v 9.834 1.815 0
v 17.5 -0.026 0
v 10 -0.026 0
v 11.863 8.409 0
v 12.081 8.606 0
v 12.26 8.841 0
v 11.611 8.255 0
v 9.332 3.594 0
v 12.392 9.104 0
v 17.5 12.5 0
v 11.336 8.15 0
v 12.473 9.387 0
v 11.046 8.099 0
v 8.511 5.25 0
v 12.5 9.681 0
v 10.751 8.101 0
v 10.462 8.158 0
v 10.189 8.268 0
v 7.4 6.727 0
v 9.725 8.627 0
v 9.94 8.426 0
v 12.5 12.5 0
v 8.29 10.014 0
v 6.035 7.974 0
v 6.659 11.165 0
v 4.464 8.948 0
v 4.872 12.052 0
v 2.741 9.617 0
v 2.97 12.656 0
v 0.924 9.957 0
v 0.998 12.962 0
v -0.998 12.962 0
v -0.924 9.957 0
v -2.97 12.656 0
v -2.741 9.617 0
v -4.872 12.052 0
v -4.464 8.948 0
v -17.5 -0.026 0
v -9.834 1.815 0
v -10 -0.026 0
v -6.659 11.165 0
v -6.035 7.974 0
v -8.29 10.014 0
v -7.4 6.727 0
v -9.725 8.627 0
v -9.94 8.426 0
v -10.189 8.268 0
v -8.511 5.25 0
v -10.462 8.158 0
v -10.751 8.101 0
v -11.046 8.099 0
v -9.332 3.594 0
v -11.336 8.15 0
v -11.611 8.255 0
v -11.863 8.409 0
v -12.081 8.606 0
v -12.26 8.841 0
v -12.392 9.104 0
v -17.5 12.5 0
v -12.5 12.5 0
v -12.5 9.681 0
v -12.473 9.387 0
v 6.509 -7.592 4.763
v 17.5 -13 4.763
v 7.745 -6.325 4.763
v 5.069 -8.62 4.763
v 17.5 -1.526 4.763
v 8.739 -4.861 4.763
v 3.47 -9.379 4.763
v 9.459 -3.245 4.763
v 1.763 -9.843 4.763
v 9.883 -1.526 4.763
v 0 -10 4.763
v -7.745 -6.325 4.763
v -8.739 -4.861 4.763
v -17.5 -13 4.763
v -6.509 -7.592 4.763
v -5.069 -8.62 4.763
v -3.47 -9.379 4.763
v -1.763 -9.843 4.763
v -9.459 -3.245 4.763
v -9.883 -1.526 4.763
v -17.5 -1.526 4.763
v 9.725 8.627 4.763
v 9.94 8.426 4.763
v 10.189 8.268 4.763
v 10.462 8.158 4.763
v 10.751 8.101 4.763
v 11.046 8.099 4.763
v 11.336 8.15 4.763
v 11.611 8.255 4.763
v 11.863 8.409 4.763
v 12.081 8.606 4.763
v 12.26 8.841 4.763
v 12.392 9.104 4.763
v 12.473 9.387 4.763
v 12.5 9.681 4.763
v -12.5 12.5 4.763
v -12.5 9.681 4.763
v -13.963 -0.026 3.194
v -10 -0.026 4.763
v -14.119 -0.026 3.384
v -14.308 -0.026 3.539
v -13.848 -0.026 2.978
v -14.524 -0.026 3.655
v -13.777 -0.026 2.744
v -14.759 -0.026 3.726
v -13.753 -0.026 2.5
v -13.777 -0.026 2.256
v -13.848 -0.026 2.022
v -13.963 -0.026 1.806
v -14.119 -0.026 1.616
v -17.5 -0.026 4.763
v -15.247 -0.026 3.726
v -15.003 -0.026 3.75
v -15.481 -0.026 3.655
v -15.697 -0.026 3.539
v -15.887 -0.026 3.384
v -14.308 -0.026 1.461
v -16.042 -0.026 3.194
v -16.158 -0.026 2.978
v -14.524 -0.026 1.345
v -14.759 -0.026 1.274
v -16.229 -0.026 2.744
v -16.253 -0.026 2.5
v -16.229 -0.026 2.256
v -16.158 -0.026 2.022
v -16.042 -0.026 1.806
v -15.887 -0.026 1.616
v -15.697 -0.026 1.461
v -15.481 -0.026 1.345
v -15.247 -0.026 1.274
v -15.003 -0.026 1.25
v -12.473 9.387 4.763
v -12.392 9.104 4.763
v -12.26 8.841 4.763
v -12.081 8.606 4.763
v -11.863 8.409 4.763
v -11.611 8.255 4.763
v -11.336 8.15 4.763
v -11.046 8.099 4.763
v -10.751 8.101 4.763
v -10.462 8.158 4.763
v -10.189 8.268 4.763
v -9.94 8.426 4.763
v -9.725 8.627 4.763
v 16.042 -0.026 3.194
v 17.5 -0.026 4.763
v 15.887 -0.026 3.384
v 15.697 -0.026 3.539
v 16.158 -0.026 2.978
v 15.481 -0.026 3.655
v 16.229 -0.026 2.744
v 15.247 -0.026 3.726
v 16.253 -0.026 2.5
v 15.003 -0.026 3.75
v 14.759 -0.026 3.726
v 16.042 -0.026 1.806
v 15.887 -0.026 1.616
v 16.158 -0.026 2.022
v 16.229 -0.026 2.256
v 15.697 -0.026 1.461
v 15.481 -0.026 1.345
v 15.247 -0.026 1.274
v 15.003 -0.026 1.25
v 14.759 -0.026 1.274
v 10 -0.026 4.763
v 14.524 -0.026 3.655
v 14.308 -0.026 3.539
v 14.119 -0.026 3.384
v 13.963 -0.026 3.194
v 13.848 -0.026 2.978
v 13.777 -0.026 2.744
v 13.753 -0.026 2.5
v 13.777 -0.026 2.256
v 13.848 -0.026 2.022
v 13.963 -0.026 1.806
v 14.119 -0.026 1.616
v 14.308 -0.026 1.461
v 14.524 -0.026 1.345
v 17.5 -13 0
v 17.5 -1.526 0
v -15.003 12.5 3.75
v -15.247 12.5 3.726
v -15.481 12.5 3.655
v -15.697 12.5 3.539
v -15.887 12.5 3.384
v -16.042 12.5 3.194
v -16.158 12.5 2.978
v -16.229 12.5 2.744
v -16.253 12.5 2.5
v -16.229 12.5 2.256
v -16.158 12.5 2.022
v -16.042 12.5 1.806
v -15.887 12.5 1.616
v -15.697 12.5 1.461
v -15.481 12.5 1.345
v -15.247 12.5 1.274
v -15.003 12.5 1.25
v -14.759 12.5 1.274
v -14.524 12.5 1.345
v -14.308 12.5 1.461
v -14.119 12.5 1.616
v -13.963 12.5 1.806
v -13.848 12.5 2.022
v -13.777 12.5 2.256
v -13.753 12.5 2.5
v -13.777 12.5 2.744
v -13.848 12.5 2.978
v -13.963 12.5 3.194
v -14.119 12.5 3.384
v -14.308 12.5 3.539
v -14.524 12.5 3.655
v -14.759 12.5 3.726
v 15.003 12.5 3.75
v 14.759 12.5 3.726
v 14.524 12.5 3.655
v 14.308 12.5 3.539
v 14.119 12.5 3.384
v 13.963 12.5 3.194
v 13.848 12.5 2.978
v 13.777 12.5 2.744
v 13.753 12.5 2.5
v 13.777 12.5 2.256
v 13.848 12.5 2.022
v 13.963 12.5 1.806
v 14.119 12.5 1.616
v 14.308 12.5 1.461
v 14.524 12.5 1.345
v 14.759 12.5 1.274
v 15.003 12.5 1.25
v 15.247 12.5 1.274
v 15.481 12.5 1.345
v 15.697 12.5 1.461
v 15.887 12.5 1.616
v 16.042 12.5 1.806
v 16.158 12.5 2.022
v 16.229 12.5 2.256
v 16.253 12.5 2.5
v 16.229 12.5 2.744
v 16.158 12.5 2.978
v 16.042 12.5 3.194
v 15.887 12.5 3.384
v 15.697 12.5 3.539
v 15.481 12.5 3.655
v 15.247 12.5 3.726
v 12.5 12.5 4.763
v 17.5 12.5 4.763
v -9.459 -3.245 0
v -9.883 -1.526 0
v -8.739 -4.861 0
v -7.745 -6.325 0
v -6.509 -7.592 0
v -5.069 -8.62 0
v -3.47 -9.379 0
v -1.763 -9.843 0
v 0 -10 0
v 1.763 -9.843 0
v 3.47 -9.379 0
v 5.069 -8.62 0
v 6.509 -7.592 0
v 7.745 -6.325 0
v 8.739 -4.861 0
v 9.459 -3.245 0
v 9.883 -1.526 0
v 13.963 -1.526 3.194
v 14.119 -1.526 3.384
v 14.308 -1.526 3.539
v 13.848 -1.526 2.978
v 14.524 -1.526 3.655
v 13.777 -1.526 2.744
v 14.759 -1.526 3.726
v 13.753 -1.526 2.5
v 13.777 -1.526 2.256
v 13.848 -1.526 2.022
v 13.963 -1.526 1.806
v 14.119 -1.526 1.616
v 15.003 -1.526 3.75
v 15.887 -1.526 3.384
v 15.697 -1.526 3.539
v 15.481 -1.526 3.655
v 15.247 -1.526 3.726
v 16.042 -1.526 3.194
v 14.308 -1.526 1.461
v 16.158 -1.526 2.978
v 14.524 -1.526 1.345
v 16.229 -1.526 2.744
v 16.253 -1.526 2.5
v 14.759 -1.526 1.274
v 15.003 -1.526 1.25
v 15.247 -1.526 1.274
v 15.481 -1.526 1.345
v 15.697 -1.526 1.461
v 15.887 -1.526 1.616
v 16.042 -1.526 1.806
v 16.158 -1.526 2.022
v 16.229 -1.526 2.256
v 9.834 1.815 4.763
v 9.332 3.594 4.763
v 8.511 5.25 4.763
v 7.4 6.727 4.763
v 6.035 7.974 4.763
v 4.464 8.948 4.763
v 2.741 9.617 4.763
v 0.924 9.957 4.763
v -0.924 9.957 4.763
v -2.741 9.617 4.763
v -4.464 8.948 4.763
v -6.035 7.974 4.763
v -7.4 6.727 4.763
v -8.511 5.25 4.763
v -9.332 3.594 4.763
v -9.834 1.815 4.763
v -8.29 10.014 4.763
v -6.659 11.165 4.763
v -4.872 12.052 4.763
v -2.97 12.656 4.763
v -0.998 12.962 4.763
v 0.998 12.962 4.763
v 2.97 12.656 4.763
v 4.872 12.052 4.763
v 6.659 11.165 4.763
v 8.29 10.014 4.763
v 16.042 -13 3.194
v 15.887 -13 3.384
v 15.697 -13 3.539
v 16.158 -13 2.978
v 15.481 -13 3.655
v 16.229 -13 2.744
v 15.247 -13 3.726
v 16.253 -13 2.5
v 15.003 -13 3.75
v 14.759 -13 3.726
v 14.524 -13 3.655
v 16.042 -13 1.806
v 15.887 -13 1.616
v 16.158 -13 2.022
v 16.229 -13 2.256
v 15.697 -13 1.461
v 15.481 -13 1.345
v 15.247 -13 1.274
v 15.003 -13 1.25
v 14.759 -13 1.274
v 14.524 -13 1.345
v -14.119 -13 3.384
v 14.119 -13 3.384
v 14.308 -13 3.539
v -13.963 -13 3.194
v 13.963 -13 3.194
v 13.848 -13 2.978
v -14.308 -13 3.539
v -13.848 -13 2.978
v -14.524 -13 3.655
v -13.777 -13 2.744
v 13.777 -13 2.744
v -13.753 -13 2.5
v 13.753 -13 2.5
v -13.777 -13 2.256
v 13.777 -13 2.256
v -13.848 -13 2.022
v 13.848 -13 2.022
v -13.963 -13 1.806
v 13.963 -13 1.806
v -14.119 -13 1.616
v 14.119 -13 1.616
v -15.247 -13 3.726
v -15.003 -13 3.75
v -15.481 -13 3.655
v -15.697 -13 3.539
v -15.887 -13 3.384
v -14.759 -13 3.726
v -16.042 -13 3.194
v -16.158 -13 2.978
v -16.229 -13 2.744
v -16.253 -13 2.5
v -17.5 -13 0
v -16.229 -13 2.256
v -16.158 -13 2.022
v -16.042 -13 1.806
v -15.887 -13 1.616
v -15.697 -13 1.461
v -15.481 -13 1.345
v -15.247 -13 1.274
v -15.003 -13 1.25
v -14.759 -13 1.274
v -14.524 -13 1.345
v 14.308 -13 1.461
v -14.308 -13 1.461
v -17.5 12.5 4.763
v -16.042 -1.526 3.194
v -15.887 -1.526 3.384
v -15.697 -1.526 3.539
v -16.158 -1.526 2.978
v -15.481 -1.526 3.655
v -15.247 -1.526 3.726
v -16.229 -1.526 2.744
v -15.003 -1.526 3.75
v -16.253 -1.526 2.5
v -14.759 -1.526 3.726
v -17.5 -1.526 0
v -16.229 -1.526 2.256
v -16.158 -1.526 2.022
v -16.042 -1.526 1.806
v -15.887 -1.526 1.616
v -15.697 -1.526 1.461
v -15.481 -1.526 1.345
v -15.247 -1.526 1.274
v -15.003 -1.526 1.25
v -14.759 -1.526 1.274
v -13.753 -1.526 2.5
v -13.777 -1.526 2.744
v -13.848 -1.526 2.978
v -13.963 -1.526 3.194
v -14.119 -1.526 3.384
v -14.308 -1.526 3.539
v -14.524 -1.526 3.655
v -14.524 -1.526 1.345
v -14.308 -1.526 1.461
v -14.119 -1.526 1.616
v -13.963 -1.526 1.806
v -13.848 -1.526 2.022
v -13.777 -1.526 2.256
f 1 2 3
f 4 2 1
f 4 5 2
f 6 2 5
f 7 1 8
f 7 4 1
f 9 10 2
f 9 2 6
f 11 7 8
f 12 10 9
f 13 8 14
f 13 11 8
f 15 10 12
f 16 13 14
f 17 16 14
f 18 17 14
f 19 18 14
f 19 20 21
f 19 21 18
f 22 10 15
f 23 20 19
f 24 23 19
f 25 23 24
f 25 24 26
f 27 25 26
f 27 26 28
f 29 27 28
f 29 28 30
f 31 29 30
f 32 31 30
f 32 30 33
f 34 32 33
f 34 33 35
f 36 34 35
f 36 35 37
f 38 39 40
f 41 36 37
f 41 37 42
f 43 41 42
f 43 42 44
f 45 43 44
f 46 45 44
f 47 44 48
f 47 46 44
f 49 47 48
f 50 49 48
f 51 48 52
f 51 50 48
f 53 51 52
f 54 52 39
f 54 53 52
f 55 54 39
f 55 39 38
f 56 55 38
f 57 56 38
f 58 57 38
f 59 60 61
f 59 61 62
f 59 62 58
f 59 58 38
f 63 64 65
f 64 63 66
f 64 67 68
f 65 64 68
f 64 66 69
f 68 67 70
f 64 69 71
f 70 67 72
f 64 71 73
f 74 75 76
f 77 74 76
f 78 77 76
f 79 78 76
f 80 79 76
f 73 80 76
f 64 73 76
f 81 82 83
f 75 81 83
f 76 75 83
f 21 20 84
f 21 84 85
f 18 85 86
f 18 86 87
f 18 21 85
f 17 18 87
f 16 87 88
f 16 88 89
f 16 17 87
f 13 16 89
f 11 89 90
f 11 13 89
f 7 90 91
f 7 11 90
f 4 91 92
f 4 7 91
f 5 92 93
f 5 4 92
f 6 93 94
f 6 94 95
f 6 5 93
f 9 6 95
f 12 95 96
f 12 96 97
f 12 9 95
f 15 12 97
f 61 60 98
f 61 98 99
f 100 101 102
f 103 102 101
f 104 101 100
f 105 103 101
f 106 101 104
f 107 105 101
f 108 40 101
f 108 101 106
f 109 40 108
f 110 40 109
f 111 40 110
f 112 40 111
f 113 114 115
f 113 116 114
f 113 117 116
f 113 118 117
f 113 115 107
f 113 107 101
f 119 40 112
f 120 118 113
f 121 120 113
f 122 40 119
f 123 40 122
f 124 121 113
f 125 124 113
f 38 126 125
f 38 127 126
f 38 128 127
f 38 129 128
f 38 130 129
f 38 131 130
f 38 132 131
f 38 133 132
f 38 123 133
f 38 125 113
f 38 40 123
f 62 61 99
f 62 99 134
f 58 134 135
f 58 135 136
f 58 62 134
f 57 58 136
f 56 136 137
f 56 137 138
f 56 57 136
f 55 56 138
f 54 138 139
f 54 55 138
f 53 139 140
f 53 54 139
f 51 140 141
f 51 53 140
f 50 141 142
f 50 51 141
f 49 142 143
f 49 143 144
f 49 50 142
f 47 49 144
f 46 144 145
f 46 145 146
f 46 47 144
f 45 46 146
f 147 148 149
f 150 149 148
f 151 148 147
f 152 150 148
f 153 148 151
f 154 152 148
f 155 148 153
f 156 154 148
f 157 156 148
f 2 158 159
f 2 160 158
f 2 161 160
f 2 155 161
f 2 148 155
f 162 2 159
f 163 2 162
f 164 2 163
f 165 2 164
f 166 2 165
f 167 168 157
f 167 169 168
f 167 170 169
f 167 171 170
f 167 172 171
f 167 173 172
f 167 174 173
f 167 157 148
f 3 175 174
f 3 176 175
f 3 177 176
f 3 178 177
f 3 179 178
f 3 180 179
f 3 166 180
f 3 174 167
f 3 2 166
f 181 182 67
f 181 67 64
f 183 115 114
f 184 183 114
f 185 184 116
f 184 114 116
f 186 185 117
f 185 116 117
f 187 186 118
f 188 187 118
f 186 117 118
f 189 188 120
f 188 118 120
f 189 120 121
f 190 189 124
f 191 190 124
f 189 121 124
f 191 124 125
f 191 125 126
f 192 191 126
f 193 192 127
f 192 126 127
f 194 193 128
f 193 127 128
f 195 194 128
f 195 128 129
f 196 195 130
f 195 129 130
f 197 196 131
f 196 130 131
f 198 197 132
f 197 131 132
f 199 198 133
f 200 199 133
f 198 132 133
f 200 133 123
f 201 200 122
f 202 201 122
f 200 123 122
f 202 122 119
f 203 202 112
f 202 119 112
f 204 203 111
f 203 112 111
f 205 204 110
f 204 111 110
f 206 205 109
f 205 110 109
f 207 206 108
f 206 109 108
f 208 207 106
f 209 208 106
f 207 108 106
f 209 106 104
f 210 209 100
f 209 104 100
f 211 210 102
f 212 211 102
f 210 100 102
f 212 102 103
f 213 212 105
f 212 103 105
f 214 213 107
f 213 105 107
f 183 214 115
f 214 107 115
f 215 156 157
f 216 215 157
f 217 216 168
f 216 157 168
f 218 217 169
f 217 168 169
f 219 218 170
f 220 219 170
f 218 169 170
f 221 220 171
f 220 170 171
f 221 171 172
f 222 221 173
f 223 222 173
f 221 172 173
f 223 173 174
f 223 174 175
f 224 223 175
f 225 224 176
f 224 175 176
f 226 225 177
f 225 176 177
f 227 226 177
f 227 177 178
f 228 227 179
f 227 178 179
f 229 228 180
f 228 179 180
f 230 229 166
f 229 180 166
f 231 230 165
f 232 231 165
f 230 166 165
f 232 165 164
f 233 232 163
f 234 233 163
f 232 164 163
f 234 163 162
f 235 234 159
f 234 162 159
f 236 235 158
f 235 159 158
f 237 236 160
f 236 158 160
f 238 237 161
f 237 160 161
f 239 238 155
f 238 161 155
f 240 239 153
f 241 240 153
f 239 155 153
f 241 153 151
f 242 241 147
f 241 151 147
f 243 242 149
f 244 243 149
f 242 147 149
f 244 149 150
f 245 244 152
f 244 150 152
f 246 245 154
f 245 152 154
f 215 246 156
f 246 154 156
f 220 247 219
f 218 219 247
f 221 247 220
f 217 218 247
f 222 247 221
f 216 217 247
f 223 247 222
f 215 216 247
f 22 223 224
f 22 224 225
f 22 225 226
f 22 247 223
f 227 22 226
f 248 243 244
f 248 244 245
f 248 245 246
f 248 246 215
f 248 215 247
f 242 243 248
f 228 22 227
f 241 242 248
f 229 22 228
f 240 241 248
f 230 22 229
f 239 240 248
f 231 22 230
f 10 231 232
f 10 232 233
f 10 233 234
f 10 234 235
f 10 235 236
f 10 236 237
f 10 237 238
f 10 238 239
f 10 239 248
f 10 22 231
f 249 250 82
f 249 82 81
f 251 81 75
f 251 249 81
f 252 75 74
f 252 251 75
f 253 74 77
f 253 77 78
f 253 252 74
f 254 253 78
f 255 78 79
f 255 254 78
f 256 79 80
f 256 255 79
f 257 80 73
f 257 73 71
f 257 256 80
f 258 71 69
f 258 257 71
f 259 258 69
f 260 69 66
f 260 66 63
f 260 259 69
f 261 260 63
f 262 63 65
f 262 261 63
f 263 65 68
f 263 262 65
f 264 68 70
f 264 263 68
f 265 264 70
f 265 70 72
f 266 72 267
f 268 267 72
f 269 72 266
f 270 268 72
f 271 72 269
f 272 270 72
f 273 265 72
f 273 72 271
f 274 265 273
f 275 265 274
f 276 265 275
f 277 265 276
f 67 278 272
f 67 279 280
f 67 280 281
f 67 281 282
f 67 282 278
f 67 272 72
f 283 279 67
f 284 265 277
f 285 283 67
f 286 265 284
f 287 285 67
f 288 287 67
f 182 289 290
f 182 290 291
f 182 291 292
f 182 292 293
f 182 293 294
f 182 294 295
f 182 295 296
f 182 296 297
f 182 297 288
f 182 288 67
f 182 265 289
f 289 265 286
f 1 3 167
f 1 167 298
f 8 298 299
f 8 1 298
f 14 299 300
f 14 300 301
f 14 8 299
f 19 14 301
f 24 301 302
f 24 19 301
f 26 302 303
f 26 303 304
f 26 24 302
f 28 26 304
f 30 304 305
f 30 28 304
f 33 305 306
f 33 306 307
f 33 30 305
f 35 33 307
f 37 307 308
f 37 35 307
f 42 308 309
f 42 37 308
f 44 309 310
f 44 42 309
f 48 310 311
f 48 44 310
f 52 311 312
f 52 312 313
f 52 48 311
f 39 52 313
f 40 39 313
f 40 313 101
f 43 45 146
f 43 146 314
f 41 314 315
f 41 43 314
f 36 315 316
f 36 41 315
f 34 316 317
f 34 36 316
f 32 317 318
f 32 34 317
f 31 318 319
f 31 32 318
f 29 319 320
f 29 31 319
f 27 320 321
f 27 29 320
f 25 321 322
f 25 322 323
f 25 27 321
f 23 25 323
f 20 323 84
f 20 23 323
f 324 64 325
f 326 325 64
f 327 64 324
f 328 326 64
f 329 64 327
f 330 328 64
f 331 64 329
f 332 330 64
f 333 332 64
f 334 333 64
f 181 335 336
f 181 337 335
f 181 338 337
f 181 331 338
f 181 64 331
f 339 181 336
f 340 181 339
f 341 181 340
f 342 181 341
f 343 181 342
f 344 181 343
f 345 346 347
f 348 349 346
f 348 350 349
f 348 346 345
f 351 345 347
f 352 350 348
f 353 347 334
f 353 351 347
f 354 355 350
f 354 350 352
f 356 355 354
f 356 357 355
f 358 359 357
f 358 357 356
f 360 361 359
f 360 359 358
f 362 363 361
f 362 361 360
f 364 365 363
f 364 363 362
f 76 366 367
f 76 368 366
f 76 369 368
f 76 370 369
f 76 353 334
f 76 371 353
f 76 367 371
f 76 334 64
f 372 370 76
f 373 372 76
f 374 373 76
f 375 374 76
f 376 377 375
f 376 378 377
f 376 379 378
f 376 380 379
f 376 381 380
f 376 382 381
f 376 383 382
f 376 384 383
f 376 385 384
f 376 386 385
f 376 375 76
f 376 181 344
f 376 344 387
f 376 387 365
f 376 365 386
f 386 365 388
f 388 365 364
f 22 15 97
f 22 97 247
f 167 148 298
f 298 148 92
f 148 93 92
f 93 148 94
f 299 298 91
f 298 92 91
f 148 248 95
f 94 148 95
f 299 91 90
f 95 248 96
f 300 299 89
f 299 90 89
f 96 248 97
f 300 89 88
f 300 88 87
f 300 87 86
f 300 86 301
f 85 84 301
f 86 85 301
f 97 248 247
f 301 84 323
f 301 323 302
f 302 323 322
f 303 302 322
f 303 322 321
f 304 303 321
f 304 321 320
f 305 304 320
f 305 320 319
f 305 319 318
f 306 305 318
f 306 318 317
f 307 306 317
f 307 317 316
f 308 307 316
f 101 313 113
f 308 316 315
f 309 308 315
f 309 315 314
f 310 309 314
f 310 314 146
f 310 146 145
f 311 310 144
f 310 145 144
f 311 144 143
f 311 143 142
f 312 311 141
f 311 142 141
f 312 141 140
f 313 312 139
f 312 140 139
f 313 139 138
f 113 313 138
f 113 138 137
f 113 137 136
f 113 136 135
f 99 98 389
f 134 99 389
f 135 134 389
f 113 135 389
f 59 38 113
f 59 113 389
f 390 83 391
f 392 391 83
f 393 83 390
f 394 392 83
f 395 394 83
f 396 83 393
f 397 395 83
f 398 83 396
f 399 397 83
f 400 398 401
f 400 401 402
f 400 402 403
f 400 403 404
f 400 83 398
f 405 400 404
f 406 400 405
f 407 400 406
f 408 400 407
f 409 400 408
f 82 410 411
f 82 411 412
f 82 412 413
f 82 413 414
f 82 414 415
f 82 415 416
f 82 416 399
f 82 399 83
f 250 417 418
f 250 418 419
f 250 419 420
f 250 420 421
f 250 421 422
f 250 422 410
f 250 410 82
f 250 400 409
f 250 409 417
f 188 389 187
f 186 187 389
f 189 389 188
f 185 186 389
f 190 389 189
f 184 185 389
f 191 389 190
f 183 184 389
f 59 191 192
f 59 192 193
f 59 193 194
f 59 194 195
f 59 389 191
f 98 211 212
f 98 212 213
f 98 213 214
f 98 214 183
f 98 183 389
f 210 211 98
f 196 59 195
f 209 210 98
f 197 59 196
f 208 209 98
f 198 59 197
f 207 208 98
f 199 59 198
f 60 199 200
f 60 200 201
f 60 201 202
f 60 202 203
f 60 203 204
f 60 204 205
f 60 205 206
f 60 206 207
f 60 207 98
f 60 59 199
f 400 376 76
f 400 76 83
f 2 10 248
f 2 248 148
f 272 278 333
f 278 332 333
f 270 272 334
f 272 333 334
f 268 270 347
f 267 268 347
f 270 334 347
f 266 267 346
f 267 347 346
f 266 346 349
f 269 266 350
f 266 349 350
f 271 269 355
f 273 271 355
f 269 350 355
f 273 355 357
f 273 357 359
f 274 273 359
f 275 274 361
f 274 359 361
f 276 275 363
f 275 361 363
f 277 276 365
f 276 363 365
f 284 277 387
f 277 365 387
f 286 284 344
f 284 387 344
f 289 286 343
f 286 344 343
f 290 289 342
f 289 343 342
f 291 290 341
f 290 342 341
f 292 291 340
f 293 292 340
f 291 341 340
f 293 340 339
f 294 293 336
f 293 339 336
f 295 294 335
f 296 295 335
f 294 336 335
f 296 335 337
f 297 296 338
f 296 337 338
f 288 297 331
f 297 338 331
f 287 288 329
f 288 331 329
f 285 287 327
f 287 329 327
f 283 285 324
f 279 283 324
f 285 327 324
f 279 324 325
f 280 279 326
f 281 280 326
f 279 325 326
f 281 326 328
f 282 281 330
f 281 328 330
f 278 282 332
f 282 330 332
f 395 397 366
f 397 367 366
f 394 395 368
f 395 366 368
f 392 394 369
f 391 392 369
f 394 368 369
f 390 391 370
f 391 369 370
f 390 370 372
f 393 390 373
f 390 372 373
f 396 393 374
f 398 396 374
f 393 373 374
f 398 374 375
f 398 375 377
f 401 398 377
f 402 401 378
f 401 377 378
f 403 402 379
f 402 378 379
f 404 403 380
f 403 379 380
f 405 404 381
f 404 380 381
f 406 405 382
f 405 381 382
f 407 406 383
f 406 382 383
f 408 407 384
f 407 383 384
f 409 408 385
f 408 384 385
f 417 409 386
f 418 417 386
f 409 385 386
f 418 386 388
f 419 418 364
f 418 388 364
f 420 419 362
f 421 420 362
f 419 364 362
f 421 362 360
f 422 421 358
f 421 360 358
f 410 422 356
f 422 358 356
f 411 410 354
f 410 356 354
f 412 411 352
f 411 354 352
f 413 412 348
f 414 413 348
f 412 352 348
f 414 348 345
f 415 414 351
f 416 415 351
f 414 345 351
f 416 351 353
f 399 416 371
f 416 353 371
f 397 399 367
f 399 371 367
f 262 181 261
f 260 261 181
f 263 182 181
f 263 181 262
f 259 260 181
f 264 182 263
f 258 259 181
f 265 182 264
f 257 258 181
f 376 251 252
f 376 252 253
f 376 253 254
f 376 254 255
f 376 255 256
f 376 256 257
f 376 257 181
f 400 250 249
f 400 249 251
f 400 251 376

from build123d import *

# Parameters (mm, degrees)
BOSS_EXTRUDE1_DEPTH   = 4.763
BOSS_EXTRUDE1_2_DEPTH = 4.763
SKETCH4_W             = 1.25
SKETCH4_H             = 25.5
SKETCH6_W             = 1.25
SKETCH6_H             = 25.5


with BuildPart() as part:
    # Sketch1 → Boss-Extrude1 (new body)
    with BuildSketch(Plane.XY):
        with BuildLine():
            Line((-17.5, 12.5), (-12.5, 12.5))
            Line((-12.5, 12.5), (-12.5, 9.68052168))
            ThreePointArc((-12.5, 9.68052168), (-11.475926116, 8.196369645), (-9.724935733, 8.627028747))
            ThreePointArc((-9.724935733, 8.627028747), (0, 13), (9.724935733, 8.627028747))
            ThreePointArc((9.724935733, 8.627028747), (11.475926116, 8.196369645), (12.5, 9.68052168))
            Line((12.5, 9.68052168), (12.5, 12.5))
            Line((12.5, 12.5), (17.5, 12.5))
            Line((17.5, 12.5), (17.5, -0.026497455))
            Line((17.5, -0.026497455), (9.999964894, -0.026497455))
            ThreePointArc((9.999964894, -0.026497455), (0, 10), (-9.999964894, -0.026497455))
            Line((-9.999964894, -0.026497455), (-17.5, -0.026497455))
            Line((-17.5, -0.026497455), (-17.5, 12.5))
        make_face()
    extrude(amount=BOSS_EXTRUDE1_DEPTH)


with BuildPart() as body_2:
    # Sketch1 → Boss-Extrude1 2 (new body)
    with BuildSketch(Plane.XY):
        with BuildLine():
            Line((17.5, -13), (-17.5, -13))
            Line((-17.5, -13), (-17.5, -1.526497455))
            Line((-17.5, -1.526497455), (-9.882803525, -1.526497455))
            ThreePointArc((-9.882803525, -1.526497455), (0, -10), (9.882803525, -1.526497455))
            Line((9.882803525, -1.526497455), (17.5, -1.526497455))
            Line((17.5, -1.526497455), (17.5, -13))
        make_face()
    extrude(amount=BOSS_EXTRUDE1_2_DEPTH)


with BuildPart() as tap_drill_for_m3x0_5_tap2_tool:
    # Sketch4 → Tap Drill for M3x0.5 Tap2 (revolve)
    with BuildSketch(Plane(origin=(-15.002809954, 12.5, 2.499998421), x_dir=(0, 0, 1), z_dir=(1, 0, 0))):
        with Locations((0.625, 12.75)):
            Rectangle(SKETCH4_W, SKETCH4_H)
    revolve(axis=Axis((-15.002809954, 18.85, 2.499998421), (0, -1, 0)))


with BuildPart() as part_1:
    add(part.part)

    # Tap Drill for M3x0.5 Tap2: cut by tap_drill_for_m3x0_5_tap2_tool
    add(tap_drill_for_m3x0_5_tap2_tool.part, mode=Mode.SUBTRACT)


with BuildPart() as body_2_1:
    add(body_2.part)

    # Tap Drill for M3x0.5 Tap2: cut by tap_drill_for_m3x0_5_tap2_tool
    add(tap_drill_for_m3x0_5_tap2_tool.part, mode=Mode.SUBTRACT)


with BuildPart() as tap_drill_for_m3x0_5_tap3_tool:
    # Sketch6 → Tap Drill for M3x0.5 Tap3 (revolve)
    with BuildSketch(Plane(origin=(15.002809954, 12.5, 2.499998421), x_dir=(0, 0, 1), z_dir=(1, 0, 0))):
        with Locations((0.625, 12.75)):
            Rectangle(SKETCH6_W, SKETCH6_H)
    revolve(axis=Axis((15.002809954, 18.85, 2.499998421), (0, -1, 0)))


with BuildPart() as part_2:
    add(part_1.part)

    # Tap Drill for M3x0.5 Tap3: cut by tap_drill_for_m3x0_5_tap3_tool
    add(tap_drill_for_m3x0_5_tap3_tool.part, mode=Mode.SUBTRACT)


with BuildPart() as body_2_2:
    add(body_2_1.part)

    # Tap Drill for M3x0.5 Tap3: cut by tap_drill_for_m3x0_5_tap3_tool
    add(tap_drill_for_m3x0_5_tap3_tool.part, mode=Mode.SUBTRACT)


solid = Compound([part_2.part, body_2_2.part])
